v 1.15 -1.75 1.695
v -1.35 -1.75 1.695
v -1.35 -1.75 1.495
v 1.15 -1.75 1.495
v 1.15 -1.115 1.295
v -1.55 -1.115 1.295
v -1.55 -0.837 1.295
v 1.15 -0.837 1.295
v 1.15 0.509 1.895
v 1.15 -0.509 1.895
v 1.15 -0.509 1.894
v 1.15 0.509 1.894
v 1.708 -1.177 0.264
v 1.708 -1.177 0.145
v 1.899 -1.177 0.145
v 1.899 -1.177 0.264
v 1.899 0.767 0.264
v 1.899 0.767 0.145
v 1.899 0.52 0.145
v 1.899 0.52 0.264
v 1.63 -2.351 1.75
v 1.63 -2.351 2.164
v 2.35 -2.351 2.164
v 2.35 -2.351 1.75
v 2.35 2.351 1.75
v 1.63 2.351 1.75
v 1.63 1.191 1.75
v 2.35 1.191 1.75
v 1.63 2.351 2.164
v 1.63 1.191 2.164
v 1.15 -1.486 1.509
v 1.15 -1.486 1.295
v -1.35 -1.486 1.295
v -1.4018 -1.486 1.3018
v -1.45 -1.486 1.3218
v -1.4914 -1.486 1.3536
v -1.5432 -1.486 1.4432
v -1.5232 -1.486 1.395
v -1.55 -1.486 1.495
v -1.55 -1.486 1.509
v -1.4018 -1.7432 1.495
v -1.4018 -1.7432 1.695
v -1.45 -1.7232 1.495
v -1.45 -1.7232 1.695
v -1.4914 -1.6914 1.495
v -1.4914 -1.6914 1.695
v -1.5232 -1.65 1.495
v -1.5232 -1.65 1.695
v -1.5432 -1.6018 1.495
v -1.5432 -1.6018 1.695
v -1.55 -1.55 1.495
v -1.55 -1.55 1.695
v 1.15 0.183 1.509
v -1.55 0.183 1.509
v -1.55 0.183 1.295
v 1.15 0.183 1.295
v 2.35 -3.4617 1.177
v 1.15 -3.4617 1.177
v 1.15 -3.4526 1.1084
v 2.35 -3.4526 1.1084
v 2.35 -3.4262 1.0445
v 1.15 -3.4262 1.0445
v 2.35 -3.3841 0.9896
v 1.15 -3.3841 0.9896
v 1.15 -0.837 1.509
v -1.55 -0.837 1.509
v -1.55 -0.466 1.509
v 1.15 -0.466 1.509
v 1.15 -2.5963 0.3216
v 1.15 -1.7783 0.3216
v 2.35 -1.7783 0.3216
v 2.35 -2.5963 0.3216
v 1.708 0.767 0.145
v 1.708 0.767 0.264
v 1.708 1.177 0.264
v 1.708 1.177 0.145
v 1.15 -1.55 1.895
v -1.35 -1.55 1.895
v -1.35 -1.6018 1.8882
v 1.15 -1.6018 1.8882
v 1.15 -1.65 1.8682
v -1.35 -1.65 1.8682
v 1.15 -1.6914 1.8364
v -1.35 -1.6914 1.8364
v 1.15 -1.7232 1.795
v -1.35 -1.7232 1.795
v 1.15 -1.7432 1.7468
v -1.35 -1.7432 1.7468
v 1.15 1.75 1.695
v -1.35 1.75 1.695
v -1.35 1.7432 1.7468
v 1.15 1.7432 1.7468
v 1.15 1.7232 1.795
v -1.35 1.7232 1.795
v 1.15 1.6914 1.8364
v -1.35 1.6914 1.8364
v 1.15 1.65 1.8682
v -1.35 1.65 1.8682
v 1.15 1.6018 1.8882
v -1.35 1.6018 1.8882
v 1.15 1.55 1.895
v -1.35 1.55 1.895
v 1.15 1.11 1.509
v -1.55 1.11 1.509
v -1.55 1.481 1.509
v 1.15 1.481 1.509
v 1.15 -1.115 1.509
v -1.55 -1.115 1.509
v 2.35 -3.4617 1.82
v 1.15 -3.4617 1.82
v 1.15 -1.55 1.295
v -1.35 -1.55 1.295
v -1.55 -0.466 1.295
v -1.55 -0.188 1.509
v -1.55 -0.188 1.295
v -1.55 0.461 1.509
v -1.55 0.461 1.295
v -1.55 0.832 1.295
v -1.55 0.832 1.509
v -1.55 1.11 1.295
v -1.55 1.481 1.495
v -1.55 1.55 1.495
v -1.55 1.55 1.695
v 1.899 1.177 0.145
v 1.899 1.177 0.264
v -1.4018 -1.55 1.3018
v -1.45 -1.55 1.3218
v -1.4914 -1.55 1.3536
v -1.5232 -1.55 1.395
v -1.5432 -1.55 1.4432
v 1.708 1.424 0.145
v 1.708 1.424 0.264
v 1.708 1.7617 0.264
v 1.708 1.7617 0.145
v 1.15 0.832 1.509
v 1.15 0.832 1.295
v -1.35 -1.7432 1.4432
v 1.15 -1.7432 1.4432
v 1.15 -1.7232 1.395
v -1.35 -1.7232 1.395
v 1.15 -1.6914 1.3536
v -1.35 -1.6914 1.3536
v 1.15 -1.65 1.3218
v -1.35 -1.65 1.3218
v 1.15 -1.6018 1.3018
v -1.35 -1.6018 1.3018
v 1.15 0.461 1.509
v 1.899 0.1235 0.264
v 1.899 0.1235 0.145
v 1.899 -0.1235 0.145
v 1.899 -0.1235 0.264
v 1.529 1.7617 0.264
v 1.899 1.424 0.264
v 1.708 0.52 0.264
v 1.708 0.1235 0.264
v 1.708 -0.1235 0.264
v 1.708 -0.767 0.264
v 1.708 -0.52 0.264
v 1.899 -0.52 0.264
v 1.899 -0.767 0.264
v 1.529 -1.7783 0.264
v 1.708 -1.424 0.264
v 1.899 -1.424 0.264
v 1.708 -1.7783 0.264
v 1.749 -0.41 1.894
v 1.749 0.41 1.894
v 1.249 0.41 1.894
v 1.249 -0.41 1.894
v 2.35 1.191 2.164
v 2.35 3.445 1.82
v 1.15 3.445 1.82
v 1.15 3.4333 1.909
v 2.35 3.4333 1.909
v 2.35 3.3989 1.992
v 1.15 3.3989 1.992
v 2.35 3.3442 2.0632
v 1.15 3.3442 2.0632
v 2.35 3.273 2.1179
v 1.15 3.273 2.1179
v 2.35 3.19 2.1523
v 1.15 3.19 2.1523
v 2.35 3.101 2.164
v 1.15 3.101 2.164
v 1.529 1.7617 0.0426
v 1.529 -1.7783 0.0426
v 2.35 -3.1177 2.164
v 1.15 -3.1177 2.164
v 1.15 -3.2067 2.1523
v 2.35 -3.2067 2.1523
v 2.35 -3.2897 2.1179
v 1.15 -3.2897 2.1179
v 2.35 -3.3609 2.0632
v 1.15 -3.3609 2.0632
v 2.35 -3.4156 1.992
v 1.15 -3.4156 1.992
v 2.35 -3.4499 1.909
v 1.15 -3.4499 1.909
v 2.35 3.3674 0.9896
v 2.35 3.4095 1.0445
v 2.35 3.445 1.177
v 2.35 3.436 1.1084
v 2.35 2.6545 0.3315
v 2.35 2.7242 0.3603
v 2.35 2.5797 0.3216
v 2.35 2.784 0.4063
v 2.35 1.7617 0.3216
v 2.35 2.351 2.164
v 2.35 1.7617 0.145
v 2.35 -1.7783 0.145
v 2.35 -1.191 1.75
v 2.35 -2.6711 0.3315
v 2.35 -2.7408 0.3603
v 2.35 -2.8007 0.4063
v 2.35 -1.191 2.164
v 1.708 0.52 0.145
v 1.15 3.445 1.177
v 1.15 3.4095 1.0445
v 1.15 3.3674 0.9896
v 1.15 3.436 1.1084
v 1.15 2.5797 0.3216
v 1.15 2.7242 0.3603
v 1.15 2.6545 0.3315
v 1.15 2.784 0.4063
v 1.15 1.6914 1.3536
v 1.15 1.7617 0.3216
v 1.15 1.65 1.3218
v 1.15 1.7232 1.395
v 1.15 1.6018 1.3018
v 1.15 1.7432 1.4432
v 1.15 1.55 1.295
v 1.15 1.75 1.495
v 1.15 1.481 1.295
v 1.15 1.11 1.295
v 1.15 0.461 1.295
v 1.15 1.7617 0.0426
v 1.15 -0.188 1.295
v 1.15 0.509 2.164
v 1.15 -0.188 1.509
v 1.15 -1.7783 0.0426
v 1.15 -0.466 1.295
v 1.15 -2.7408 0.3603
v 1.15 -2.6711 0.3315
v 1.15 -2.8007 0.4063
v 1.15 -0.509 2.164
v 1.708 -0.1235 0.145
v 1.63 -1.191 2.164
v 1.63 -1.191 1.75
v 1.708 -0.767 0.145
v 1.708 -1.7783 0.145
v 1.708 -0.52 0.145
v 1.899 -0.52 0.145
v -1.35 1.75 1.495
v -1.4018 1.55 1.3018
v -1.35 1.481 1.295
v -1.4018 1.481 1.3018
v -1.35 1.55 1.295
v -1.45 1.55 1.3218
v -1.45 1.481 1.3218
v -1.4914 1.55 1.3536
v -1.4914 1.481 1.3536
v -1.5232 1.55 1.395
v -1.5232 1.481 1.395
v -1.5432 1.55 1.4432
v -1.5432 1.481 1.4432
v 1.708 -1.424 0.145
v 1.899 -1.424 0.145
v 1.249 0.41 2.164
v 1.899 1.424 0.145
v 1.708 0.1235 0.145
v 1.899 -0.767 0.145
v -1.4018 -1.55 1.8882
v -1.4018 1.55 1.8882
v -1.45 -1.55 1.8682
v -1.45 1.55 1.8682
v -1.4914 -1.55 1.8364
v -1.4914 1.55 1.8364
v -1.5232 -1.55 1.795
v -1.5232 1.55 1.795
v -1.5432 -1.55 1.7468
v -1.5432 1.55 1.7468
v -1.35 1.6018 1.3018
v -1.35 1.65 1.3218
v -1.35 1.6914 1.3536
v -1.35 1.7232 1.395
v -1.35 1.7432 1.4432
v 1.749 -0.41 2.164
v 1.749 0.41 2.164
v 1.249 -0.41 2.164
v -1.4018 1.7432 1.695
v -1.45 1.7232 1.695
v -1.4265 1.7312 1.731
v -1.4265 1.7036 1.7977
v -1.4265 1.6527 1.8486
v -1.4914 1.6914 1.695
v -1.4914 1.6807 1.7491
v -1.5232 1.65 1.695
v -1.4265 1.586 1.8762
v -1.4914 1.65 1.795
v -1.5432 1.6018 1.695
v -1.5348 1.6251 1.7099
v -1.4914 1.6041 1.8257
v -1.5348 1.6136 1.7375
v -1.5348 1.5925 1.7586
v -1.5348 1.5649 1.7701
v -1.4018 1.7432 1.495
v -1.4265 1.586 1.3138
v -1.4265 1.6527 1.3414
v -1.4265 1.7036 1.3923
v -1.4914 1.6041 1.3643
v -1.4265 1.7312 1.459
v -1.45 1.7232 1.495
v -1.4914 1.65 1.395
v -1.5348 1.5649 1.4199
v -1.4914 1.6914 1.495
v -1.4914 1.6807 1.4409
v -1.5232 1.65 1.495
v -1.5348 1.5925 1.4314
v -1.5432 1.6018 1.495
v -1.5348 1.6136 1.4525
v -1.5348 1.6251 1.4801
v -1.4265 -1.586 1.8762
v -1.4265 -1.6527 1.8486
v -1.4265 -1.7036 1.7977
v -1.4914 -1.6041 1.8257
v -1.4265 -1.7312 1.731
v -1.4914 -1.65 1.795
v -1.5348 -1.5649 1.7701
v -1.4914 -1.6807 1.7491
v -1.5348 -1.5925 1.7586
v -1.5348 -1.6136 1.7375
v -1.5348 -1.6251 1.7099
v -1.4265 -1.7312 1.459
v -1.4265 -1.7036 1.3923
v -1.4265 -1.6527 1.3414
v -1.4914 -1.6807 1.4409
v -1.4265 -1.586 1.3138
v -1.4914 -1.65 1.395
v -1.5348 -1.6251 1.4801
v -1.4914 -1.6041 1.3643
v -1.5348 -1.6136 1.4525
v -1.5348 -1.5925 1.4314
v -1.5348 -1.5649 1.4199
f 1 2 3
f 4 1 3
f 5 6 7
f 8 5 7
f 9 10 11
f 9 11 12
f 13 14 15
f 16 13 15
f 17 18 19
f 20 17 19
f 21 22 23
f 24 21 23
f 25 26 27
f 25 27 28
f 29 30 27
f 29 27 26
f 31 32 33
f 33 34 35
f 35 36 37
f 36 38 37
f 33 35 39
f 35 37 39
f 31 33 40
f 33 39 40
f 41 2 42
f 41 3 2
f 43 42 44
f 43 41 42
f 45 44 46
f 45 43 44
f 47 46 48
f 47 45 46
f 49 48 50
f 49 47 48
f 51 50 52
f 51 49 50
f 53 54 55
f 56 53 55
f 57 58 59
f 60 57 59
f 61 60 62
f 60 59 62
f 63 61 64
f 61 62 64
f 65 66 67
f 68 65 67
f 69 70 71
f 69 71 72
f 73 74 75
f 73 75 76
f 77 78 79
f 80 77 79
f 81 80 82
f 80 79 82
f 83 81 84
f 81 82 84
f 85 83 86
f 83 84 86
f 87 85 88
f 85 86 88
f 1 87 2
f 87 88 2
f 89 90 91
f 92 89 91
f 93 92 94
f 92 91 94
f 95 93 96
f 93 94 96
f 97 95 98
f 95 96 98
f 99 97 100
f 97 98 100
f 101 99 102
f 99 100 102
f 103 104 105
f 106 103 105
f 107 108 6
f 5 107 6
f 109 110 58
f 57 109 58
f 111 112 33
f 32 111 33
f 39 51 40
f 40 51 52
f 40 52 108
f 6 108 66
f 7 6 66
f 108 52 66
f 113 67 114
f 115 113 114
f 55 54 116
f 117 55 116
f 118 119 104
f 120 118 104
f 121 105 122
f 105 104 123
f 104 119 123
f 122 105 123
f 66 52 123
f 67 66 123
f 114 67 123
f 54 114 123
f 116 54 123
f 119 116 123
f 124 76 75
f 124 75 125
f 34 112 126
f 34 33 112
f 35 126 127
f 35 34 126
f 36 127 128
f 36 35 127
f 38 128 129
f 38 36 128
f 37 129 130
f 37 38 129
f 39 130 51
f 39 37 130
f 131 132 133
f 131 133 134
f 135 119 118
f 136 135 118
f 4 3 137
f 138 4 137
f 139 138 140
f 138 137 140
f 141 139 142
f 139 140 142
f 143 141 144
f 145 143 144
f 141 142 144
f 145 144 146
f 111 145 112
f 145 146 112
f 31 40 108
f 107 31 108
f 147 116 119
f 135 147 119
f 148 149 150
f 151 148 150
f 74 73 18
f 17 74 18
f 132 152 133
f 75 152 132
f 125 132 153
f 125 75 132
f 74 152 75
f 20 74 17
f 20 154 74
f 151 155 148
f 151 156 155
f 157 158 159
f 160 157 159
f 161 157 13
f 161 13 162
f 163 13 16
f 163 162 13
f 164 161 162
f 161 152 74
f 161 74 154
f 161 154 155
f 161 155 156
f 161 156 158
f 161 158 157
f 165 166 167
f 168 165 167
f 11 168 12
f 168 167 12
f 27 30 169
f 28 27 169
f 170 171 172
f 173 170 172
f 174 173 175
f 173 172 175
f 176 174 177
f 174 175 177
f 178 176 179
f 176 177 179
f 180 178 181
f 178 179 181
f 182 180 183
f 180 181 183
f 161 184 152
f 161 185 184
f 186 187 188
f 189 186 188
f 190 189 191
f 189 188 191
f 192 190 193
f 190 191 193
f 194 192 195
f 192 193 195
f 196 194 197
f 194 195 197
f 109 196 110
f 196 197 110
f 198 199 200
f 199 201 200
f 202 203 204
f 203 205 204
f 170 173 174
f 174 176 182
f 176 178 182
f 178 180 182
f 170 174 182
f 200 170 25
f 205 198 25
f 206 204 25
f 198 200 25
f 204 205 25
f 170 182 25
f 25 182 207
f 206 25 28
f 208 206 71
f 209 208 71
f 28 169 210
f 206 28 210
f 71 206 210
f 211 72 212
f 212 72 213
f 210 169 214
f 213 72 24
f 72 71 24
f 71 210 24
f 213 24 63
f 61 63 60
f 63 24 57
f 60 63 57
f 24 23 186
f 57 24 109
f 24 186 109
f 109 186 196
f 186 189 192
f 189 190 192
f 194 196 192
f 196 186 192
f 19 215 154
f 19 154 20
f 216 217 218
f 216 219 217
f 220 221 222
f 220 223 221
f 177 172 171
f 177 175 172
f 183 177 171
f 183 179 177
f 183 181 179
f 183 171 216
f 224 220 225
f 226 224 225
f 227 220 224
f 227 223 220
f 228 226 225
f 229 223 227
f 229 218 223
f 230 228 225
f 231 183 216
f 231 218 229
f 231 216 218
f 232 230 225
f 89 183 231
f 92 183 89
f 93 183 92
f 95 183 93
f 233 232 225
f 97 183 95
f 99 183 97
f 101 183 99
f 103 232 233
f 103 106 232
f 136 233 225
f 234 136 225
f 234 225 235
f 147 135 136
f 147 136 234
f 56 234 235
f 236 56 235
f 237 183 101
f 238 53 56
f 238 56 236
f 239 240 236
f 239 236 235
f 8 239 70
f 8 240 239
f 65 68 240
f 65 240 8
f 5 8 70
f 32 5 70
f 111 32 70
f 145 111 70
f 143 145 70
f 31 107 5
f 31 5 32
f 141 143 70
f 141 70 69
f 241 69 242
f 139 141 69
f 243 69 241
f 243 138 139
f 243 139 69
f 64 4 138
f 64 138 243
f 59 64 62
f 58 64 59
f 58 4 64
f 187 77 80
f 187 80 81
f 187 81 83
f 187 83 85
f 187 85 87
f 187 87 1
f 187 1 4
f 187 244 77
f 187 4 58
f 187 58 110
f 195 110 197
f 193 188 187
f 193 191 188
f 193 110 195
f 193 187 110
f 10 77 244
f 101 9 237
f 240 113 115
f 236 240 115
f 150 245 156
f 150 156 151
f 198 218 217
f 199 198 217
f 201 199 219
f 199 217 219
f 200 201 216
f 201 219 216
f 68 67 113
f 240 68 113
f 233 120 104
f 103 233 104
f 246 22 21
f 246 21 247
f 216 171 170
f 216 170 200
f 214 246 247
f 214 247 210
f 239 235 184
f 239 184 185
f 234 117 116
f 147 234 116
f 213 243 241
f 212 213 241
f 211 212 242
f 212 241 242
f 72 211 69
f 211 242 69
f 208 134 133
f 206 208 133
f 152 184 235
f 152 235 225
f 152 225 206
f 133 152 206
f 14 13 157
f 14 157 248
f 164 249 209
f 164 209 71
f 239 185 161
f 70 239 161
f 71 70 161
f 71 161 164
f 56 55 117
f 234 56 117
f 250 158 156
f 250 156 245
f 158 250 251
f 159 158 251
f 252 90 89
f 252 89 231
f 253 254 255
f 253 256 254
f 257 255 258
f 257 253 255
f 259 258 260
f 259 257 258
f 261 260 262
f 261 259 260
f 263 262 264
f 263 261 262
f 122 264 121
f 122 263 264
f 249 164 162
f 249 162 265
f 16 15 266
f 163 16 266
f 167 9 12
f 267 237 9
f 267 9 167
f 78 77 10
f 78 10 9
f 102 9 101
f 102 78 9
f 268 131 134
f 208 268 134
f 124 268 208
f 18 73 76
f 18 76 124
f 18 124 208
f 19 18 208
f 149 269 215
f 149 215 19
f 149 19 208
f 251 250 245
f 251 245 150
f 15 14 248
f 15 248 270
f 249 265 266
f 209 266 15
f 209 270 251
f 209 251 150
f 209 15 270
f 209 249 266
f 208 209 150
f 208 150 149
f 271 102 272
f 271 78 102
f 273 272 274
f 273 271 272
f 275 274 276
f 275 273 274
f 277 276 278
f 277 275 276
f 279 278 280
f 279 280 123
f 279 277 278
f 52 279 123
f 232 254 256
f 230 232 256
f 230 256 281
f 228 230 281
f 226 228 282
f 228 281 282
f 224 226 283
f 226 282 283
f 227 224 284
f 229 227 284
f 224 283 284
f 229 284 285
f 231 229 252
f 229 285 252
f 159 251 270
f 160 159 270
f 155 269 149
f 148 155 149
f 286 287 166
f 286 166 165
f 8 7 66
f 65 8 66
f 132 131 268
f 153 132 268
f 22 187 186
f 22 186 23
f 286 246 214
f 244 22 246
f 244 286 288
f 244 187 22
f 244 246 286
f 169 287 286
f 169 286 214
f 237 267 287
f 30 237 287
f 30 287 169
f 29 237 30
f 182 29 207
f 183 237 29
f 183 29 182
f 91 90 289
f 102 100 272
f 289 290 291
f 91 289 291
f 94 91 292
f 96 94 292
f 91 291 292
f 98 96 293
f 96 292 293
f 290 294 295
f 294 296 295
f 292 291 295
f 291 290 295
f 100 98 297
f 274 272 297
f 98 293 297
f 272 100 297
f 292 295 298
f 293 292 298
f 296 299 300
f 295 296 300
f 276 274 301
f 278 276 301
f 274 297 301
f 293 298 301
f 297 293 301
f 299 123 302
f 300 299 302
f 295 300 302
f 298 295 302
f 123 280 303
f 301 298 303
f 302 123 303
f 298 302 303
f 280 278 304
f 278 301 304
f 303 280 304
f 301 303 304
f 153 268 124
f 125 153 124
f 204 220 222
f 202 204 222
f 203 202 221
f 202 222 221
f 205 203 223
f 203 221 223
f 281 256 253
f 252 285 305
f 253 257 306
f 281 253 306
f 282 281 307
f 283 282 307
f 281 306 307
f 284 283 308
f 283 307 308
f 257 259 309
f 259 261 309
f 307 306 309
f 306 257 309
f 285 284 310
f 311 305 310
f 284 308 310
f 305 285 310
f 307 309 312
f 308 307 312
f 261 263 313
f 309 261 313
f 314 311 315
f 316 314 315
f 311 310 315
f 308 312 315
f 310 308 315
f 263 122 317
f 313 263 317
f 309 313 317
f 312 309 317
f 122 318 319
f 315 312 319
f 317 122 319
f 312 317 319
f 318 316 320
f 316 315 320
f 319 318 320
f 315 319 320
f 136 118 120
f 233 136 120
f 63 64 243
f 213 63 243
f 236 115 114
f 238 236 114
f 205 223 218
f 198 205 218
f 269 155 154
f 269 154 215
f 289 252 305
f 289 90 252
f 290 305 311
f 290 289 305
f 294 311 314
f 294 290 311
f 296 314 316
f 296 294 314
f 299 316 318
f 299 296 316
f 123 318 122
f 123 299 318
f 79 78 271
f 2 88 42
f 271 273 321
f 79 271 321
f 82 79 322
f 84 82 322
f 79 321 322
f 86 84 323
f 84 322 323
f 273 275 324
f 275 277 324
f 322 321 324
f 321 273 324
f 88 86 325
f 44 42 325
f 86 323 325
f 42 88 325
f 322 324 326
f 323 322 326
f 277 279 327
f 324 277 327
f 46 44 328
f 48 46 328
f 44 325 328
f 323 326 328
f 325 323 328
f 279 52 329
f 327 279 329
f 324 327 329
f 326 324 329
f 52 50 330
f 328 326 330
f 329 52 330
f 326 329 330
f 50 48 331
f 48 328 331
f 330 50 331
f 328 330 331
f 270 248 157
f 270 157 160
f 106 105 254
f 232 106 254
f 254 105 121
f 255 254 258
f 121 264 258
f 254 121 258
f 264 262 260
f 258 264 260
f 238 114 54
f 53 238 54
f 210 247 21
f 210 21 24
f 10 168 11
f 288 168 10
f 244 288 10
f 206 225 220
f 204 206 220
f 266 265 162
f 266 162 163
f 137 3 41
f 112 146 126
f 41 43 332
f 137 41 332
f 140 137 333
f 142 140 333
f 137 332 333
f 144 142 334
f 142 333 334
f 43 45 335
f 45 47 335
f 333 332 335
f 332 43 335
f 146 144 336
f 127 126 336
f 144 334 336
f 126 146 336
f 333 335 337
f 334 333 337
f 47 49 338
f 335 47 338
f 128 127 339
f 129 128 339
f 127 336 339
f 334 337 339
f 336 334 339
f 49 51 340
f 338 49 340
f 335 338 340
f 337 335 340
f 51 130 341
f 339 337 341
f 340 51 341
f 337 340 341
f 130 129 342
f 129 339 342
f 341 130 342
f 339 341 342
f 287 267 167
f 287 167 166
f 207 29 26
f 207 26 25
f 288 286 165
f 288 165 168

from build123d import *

# Parameters (mm, degrees)
PAD009_DEPTH    = 1.8
PAD008_DEPTH    = 1.2
SKETCH018_W     = 0.214
SKETCH018_H     = 0.247
POCKET007_DEPTH = 0.119
SKETCH019_W     = 0.72
SKETCH019_H     = 1.16
POCKET008_DEPTH = 0.414
POCKET009_DEPTH = 0.27
PAD013_DEPTH    = 2.7
FILLET001_R     = 0.2


with BuildPart() as pad009:
    # Sketch017 → Pad009 (new body, symmetric)
    with BuildSketch(Plane.XZ):
        Polygon((1.529, 0), (1.529, 0.264), (1.708, 0.264), (1.708, 0.145), (2.358, 0.145), (2.358, 0), align=None)
    extrude(amount=PAD009_DEPTH, both=True)


with BuildPart() as part_back:
    # Sketch016 → Pad008 (new body)
    with BuildSketch(Plane(origin=(1.1499999635, -0.0083336435, -0.0078429583), x_dir=(0, 1, 0), z_dir=(1, 0, 0))):
        with BuildLine():
            Line((-3.1093336572, 2.1718425317), (3.1093336572, 2.1718425317))
            ThreePointArc((3.4533336572, 1.8278425317), (3.35257839, 2.0710872645), (3.1093336572, 2.1718425317))
            Line((3.4533336572, 1.8278425317), (3.4533336572, 1.1848425317))
            ThreePointArc((3.3757169542, 0.9974592347), (3.4331617333, 1.0834314222), (3.4533336572, 1.1848425317))
            Line((2.7923538598, 0.4140961402), (3.3757169542, 0.9974592347))
            ThreePointArc((2.588, 0.32945), (2.698595512, 0.3514488151), (2.7923538598, 0.4140961402))
            Line((1.77, 0.32945), (2.588, 0.32945))
            Line((1.77, 0.05045), (1.77, 0.32945))
            Line((1.77, 0.05045), (-1.77, 0.05045))
            Line((-1.77, 0.05045), (-1.77, 0.32945))
            Line((-1.77, 0.32945), (-2.588, 0.32945))
            ThreePointArc((-2.7923538598, 0.4140961402), (-2.698595512, 0.3514488151), (-2.588, 0.32945))
            Line((-3.3757169542, 0.9974592347), (-2.7923538598, 0.4140961402))
            ThreePointArc((-3.4533336572, 1.1848425317), (-3.4331617333, 1.0834314222), (-3.3757169542, 0.9974592347))
            Line((-3.4533336572, 1.8278425317), (-3.4533336572, 1.1848425317))
            ThreePointArc((-3.1093336572, 2.1718425317), (-3.35257839, 2.0710872645), (-3.4533336572, 1.8278425317))
        make_face()
    extrude(amount=PAD008_DEPTH)

    # Cut: cut Pad009
    add(pad009.part, mode=Mode.SUBTRACT)

    # Sketch018 (on Face19 of Cut) → Pocket007 (cut)
    with BuildSketch(Plane(origin=(0, 0, 0.145), x_dir=(1, 0, 0), z_dir=(0, 0, -1))):
        with Locations((1.792, -1.3005)):
            Rectangle(SKETCH018_W, SKETCH018_H)
        with Locations((1.792, -0.6435)):
            Rectangle(SKETCH018_W, SKETCH018_H)
        with Locations((1.792, 0)):
            Rectangle(SKETCH018_W, SKETCH018_H)
        with Locations((1.792, 0.6435)):
            Rectangle(SKETCH018_W, SKETCH018_H)
        with Locations((1.792, 1.3005)):
            Rectangle(SKETCH018_W, SKETCH018_H)
    extrude(amount=-POCKET007_DEPTH, mode=Mode.SUBTRACT)

    # Sketch019 (on Face2 of Pocket007) → Pocket008 (cut)
    with BuildSketch(Plane.XY.offset(2.1639995734)):
        with Locations((1.9899999635, -1.771)):
            Rectangle(SKETCH019_W, SKETCH019_H)
        with Locations((1.9899999635, 1.771)):
            Rectangle(SKETCH019_W, SKETCH019_H)
    extrude(amount=-POCKET008_DEPTH, mode=Mode.SUBTRACT)

    # Sketch020 (on Face2 of Pocket008) → Pocket009 (cut)
    with BuildSketch(Plane.XY.offset(2.1639995734)):
        Polygon((1.249, 0.41), (1.749, 0.41), (1.749, -0.41), (1.249, -0.41), (1.146, -0.513), (1.146, 0.513), align=None)
    extrude(amount=-POCKET009_DEPTH, mode=Mode.SUBTRACT)


with BuildPart() as inner:
    # Sketch029 → Pad013 (new body)
    with BuildSketch(Plane(origin=(-1.5500000108, 1.37e-08, -0.0050004214), x_dir=(0, 1, 0), z_dir=(1, 0, 0))):
        with BuildLine():
            Line((-1.75, 1.6999999949), (-1.75, 1.5000000051))
            ThreePointArc((-1.75, 1.5000000051), (-1.6914213581, 1.3585786456), (-1.55, 1.3))
            Line((-1.55, 1.3), (-1.486, 1.3))
            Line((-1.486, 1.3), (-1.486, 1.514))
            Line((-1.486, 1.514), (-1.115, 1.514))
            Line((-1.115, 1.514), (-1.115, 1.3))
            Line((-1.115, 1.3), (-0.837, 1.3))
            Line((-0.837, 1.3), (-0.837, 1.514))
            Line((-0.837, 1.514), (-0.466, 1.514))
            Line((-0.466, 1.514), (-0.466, 1.3))
            Line((-0.466, 1.3), (-0.188, 1.3))
            Line((-0.188, 1.3), (-0.188, 1.514))
            Line((-0.188, 1.514), (0.183, 1.514))
            Line((0.183, 1.514), (0.183, 1.3))
            Line((0.183, 1.3), (0.461, 1.3))
            Line((0.461, 1.3), (0.461, 1.514))
            Line((0.461, 1.514), (0.832, 1.514))
            Line((0.832, 1.514), (0.832, 1.3))
            Line((0.832, 1.3), (1.11, 1.3))
            Line((1.11, 1.3), (1.11, 1.514))
            Line((1.11, 1.514), (1.481, 1.514))
            Line((1.481, 1.514), (1.481, 1.3))
            Line((1.481, 1.3), (1.55, 1.3))
            ThreePointArc((1.55, 1.3), (1.6914213581, 1.3585786456), (1.75, 1.5000000051))
            Line((1.75, 1.6999999949), (1.75, 1.5000000051))
            ThreePointArc((1.75, 1.6999999949), (1.6914213581, 1.8414213544), (1.55, 1.9))
            Line((-1.55, 1.9), (1.55, 1.9))
            ThreePointArc((-1.55, 1.9), (-1.6914213581, 1.8414213544), (-1.75, 1.6999999949))
        make_face()
    extrude(amount=PAD013_DEPTH)

    # Fillet001
    fillet001_edges = [inner.edges().sort_by_distance(p)[0] for p in [
        (-1.55, -1.75, 1.595),
        (-1.55, -1.691421, 1.353578),
        (-1.55, 1.691421, 1.353578),
        (-1.55, 1.75, 1.595),
        (-1.55, 1.691421, 1.836421),
        (-1.55, 0, 1.895),
        (-1.55, -1.691421, 1.836421),
    ]]
    fillet(fillet001_edges, radius=FILLET001_R)

    # Fusion002: union Part-back
    add(part_back.part)


solid = inner.part
